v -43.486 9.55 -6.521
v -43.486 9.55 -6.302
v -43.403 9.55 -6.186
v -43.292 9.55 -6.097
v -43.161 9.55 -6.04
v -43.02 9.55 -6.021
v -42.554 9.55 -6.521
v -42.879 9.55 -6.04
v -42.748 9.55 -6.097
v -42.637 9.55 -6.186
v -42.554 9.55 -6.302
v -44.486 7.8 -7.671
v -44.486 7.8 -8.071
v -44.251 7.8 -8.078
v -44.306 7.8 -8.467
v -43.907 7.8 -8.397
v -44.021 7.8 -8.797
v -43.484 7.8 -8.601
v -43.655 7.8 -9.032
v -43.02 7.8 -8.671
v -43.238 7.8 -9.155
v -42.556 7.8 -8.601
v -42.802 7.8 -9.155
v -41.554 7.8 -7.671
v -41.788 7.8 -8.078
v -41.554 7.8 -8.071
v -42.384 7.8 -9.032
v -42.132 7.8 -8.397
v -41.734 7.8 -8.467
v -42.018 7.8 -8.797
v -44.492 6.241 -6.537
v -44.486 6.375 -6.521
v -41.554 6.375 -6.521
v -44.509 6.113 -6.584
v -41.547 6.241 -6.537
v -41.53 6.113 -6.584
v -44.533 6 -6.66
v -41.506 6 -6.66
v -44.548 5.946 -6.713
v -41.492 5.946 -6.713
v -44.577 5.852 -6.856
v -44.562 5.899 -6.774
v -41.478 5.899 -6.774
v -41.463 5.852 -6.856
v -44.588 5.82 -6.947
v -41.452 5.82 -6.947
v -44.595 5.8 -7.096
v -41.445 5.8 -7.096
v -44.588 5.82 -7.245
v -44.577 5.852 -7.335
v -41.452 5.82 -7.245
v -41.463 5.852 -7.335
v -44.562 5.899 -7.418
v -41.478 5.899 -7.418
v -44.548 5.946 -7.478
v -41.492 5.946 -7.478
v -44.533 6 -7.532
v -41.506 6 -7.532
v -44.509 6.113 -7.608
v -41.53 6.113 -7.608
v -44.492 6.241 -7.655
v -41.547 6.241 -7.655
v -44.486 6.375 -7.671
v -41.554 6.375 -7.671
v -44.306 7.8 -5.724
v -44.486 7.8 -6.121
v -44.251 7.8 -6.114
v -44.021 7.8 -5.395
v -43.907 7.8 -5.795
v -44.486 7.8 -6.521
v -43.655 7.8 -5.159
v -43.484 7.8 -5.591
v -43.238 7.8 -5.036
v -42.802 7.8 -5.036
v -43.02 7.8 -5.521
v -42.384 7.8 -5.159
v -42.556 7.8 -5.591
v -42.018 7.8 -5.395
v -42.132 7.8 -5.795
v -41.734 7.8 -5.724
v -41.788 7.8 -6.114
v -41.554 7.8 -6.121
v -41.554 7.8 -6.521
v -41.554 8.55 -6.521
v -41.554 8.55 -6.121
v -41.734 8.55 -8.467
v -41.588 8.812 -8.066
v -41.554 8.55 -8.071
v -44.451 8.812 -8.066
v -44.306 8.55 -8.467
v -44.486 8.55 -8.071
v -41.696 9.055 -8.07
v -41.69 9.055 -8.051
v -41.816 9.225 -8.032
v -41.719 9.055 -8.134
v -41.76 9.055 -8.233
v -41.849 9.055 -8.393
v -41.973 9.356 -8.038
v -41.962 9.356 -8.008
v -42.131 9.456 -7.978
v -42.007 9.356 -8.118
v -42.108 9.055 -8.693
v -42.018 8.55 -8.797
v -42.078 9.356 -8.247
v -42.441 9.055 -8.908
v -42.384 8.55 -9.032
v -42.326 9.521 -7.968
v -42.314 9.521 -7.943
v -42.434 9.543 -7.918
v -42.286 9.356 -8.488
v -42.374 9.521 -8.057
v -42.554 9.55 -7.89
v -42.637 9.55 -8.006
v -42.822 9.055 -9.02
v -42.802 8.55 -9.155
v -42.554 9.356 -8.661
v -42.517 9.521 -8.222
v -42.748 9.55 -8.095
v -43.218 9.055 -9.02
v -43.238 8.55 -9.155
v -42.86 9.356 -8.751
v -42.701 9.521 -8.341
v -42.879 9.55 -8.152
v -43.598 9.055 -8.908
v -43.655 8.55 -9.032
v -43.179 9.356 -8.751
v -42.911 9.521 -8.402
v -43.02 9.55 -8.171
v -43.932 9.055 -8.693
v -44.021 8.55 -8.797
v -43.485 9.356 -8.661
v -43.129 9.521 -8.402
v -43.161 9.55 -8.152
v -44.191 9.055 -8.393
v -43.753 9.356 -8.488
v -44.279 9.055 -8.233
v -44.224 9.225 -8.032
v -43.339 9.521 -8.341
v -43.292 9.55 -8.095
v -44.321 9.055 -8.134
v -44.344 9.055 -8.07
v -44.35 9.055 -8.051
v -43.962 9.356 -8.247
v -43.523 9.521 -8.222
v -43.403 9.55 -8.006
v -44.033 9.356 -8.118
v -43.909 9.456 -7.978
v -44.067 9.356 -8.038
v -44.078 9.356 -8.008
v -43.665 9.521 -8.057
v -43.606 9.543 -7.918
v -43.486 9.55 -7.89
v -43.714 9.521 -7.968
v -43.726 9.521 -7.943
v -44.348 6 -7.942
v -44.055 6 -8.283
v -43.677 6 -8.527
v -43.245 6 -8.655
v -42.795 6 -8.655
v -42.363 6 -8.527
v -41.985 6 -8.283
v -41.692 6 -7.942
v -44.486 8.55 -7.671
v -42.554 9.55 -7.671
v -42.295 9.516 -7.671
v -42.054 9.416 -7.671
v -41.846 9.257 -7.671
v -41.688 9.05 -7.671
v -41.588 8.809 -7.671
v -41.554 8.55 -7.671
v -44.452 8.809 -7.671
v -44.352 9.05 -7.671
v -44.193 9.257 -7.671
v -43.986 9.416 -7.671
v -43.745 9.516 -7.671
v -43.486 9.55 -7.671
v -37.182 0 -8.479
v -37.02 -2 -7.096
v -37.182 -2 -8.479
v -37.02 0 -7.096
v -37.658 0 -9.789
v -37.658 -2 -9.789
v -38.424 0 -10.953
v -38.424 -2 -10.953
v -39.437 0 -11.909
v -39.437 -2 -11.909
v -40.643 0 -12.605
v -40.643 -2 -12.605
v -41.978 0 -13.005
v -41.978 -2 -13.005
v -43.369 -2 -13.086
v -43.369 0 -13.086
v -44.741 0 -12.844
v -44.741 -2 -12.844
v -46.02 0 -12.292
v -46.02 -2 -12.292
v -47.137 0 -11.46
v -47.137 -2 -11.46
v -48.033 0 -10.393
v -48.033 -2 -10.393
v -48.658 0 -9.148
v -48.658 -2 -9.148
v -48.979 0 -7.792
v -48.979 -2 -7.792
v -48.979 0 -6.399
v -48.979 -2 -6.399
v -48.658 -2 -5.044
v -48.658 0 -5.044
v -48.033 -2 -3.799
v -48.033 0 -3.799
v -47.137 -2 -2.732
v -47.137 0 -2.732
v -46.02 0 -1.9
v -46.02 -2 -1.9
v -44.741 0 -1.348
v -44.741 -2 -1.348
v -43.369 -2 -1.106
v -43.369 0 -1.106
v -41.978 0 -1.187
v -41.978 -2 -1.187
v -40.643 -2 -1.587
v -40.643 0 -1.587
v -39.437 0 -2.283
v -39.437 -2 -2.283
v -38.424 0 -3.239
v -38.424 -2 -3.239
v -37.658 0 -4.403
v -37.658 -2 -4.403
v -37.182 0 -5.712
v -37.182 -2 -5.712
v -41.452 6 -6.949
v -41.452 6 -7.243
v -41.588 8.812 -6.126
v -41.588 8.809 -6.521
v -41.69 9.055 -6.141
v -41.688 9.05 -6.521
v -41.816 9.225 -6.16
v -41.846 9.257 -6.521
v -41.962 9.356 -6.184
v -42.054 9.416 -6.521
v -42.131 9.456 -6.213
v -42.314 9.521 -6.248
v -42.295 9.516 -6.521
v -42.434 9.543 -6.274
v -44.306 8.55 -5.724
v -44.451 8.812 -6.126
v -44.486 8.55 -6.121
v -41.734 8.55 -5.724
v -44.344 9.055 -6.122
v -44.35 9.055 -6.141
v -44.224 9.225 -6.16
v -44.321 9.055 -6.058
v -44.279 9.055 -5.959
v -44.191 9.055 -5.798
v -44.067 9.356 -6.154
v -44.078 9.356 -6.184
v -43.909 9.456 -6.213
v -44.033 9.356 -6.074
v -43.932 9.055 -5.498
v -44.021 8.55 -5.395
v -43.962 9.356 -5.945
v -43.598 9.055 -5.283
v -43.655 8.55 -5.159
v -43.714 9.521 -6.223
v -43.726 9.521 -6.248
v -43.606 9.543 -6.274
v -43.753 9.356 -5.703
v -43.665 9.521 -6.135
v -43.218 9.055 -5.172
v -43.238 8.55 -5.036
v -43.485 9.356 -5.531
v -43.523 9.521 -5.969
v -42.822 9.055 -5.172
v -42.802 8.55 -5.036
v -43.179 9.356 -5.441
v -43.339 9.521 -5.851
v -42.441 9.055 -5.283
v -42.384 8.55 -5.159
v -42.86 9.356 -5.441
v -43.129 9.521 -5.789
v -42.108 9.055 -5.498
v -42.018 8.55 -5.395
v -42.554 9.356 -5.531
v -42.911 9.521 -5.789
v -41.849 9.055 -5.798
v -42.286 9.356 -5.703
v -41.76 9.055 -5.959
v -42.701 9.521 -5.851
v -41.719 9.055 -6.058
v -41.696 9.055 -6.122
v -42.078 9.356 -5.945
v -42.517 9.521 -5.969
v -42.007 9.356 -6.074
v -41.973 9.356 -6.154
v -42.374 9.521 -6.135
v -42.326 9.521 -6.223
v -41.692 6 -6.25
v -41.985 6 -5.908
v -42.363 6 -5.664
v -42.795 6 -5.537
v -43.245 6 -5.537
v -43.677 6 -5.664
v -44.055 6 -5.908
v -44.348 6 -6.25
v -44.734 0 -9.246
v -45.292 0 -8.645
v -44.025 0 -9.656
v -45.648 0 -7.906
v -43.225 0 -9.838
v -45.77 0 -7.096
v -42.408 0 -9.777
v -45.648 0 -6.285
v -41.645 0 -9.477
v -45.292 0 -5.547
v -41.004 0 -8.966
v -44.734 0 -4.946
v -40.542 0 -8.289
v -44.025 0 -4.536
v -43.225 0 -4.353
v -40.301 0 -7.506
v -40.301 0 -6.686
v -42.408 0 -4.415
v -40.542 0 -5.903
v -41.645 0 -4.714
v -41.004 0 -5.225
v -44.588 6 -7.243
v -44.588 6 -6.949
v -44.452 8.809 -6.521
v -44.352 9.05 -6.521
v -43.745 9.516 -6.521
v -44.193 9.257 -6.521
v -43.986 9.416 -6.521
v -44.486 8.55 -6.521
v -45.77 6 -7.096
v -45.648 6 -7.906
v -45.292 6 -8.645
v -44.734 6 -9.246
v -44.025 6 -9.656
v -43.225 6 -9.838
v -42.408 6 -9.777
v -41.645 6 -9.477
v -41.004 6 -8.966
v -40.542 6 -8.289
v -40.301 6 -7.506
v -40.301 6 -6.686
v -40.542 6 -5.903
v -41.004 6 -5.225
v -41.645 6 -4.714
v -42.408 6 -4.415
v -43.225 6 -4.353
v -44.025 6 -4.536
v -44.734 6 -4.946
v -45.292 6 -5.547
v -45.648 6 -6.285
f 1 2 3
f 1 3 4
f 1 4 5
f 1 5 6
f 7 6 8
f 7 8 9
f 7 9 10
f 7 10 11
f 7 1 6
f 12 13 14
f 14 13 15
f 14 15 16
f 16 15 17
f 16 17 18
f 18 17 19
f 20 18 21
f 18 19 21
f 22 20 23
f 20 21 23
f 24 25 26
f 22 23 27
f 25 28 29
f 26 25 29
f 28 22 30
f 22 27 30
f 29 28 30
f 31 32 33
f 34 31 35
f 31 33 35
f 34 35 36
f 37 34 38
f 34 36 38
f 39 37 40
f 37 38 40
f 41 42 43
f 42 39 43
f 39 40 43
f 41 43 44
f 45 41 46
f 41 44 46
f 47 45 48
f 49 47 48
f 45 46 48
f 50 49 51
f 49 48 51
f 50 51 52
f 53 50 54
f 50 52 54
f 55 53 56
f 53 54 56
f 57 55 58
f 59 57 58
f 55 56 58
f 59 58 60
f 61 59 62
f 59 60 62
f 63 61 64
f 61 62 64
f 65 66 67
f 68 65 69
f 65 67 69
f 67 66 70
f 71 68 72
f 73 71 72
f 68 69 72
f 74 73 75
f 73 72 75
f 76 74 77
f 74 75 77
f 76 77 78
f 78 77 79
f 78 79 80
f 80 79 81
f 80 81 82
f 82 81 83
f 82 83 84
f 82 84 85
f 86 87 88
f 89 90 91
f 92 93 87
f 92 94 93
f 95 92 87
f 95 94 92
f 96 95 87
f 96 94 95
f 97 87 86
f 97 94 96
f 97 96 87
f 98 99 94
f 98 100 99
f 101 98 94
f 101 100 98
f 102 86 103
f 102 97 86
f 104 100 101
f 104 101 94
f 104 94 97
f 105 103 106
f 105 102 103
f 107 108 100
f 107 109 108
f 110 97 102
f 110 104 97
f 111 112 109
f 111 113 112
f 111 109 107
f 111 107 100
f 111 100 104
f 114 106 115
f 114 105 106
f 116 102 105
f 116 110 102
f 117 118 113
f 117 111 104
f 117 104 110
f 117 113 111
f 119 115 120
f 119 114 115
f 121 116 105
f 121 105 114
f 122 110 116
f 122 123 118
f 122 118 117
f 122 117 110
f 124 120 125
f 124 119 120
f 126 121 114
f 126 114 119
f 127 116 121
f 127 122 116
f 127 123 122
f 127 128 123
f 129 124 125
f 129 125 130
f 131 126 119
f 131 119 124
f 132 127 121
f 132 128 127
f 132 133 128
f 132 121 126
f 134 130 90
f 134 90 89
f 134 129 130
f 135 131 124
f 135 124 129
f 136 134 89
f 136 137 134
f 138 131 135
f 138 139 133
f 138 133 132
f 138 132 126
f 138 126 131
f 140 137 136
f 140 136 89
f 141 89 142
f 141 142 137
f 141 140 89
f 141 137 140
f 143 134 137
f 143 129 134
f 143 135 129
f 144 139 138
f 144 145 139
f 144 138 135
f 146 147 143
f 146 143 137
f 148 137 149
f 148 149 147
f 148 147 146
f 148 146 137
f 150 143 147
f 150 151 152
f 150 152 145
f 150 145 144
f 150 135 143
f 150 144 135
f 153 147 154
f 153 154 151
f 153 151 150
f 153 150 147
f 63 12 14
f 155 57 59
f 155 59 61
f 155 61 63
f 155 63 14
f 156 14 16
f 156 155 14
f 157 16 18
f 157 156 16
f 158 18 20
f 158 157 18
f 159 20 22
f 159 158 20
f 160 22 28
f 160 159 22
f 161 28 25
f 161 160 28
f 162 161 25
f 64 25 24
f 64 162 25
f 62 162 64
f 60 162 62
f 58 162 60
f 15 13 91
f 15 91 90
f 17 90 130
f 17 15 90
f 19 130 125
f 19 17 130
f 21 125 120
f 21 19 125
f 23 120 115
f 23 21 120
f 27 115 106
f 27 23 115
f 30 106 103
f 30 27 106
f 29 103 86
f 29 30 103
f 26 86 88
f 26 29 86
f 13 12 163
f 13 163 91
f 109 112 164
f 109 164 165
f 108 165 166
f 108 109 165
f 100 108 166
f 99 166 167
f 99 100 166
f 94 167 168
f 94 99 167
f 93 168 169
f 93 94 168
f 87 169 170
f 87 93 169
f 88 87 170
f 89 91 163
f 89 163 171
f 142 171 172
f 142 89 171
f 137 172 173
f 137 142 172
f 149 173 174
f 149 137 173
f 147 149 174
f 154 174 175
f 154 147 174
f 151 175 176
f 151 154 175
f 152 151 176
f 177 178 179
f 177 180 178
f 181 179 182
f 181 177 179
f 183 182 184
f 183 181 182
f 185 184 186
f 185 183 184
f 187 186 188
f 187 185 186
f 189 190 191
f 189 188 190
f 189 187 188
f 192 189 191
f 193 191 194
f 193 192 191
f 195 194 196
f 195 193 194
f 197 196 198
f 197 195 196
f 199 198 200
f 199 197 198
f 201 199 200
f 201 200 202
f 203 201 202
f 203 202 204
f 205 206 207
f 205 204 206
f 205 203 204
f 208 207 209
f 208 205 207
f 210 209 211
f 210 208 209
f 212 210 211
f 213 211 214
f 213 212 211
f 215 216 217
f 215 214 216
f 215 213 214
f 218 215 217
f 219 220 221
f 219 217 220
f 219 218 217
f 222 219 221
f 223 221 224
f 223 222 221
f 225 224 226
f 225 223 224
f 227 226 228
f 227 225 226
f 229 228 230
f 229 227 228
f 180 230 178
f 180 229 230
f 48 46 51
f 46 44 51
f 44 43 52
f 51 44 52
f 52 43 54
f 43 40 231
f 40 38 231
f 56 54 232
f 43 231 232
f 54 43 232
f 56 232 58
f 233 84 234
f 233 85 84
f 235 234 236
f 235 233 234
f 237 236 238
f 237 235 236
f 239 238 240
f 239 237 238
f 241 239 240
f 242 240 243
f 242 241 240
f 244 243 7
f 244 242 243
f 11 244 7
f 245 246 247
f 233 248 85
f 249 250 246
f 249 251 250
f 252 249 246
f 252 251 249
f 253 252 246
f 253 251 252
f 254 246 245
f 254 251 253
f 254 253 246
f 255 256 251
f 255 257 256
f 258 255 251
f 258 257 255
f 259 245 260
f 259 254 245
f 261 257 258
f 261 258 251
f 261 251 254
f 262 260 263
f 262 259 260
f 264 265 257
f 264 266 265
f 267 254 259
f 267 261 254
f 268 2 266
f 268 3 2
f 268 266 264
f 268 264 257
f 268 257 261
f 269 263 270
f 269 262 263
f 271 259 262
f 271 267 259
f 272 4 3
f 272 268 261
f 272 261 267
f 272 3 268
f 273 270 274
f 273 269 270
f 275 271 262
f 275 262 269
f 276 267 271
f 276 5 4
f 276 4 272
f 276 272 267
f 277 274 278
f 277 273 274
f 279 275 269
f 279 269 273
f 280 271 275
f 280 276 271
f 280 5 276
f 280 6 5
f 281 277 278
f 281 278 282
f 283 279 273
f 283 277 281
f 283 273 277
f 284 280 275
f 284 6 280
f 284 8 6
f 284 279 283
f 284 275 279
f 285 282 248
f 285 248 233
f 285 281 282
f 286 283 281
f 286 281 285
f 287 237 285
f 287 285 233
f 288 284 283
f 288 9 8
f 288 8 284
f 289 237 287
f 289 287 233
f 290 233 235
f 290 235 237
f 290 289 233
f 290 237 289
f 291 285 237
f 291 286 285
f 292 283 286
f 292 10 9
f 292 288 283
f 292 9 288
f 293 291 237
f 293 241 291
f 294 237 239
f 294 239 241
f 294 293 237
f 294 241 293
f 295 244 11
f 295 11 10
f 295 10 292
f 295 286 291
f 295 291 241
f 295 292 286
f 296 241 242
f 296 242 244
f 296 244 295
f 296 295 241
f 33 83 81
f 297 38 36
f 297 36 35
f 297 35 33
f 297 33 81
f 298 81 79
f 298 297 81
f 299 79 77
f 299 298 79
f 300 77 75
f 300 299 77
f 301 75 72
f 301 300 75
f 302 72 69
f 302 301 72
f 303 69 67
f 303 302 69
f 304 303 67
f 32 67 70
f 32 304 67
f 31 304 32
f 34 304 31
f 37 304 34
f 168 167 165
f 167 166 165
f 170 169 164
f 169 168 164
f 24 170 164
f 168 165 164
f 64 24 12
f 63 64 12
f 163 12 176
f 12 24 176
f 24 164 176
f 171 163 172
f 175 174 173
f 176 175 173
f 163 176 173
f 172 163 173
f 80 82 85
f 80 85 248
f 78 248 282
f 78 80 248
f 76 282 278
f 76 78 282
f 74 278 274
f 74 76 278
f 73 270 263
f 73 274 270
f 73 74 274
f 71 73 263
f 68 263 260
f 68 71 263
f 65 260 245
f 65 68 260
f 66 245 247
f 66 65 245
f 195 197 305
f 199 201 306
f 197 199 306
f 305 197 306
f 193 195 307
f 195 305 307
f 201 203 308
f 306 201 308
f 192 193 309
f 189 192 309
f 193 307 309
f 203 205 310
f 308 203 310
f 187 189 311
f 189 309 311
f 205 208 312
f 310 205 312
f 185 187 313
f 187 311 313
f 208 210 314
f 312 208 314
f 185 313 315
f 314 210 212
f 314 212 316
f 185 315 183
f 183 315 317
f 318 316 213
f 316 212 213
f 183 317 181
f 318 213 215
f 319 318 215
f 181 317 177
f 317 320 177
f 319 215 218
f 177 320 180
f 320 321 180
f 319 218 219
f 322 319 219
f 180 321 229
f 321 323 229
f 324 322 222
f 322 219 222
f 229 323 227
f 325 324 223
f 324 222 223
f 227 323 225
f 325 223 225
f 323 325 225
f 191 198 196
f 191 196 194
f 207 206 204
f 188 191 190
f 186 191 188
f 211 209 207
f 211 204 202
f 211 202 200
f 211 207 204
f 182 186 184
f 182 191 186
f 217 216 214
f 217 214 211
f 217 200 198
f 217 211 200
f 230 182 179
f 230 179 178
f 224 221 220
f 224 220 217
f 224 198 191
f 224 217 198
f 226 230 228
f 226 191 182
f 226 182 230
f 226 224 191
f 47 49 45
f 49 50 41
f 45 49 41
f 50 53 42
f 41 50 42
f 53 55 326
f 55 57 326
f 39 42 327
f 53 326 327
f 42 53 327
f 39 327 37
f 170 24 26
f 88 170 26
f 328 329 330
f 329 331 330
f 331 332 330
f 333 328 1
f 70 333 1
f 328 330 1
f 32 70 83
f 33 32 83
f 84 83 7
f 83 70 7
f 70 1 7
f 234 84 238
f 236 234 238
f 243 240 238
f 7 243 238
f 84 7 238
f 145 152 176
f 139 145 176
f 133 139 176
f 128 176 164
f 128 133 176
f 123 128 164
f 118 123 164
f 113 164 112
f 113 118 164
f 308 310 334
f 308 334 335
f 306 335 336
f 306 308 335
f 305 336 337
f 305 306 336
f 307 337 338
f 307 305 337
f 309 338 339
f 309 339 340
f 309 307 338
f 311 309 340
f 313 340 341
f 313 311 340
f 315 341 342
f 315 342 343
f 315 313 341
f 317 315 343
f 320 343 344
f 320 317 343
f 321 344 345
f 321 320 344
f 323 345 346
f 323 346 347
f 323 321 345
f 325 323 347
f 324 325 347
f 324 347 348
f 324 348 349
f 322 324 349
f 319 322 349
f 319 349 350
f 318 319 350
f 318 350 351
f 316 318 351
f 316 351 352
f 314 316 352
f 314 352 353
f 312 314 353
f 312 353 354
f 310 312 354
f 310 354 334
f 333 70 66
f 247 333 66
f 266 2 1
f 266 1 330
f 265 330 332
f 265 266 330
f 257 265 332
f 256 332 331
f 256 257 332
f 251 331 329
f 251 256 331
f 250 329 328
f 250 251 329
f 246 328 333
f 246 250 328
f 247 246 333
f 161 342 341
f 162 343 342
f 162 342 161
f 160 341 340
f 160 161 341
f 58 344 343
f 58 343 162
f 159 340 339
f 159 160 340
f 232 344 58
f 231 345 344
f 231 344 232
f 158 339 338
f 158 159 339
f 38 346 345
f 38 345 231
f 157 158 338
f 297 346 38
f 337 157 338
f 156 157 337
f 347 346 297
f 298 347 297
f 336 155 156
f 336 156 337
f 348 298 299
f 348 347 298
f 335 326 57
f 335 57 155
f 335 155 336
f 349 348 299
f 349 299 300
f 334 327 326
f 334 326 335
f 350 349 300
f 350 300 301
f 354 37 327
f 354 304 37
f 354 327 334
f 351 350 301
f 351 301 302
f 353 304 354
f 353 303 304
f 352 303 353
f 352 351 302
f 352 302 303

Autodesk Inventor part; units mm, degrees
ref_plane "YZ Plane" through (0, 0, 0) normal (1, 0, 0) x (0, 1, 0)
ref_plane "XZ Plane" through (0, 0, 0) normal (0, 1, 0) x (-1, 0, 0)
ref_plane "XY Plane" through (0, 0, 0) normal (0, 0, 1) x (1, 0, 0)
sketch "Sketch1" plane through (0, 0, 0) normal (0, 1, 0) x (-1, 0, 0)
  circle A0 centre (43.0199, -7.0958) radius 2.75
  circle A1 centre (-31.8801, -7.0958) radius 2.75
  circle A2 centre (44.3199, 41.1042) radius 2.75
  circle A3 centre (-38.2801, 41.1042) radius 2.75
  line L0 (58.8879, -10.055) -> (-40.7911, -10.055) construction
  line L1 (-40.7911, -10.055) -> (-40.7911, 44.0634) construction
  line L2 (-40.7911, 44.0634) -> (58.8879, 44.0634) construction
  line L3 (58.8879, 44.0634) -> (58.8879, -10.055) construction
  line L4 (43.0199, -7.0958) -> (43.0199, -10.055)
  line L5 (44.3199, 41.1042) -> (44.3199, 44.0634)
  line L6 (47.0699, -9.8458) -> (-41.0301, -9.8458)
  line L7 (-41.0301, -9.8458) -> (-41.0301, 43.8542)
  line L8 (-41.0301, 43.8542) -> (47.0699, 43.8542)
  line L9 (47.0699, 43.8542) -> (47.0699, -9.8458)
  dimension "d0" = 5.5
  dimension "d1" = 74.9
  dimension "d2" = 1.3
  dimension "d3" = 48.2
  dimension "d5" = 82.6
  dimension "d9" = 15.868
  dimension "d10" = 54.1184
  dimension "d11" = 99.679
extrude "Extrusion2" add sketch "Sketch1" along normal blind 6 contours A0
sketch "Sketch4" plane through (-43.0199, 6, -7.0958) normal (0, 1, 0) x (1, 0, 0)
  circle A0 centre (0, 0) radius 2.75 projected
  circle A1 centre (0, 0) radius 1.575
  point P0 (43.0199, -7.0958)
  dimension "d24" = 3.15
extrude "Extrusion3" add sketch "Sketch4" along normal blind 1.8 contours A1
sketch "Sketch5" plane through (-43.0199, 7.8, -7.0958) normal (0, 1, 0) x (1, 0, 0)
  line L0 (-1.575, -0.575) -> (1.575, -0.575)
  line L1 (1.575, -0.575) -> (1.575, 0.575)
  line L2 (1.575, 0.575) -> (-1.575, 0.575)
  line L3 (-1.575, 0.575) -> (-1.575, -0.575)
  line L4 (-1.575, -0.575) -> (1.575, 0.575) construction
  line L5 (1.575, -0.575) -> (-1.575, 0.575) construction
  circle A0 centre (0, 0) radius 1.575 projected
  point P0 (43.0199, -7.0958)
  point P1 (-1.4663, -0.575)
  point P2 (1.4663, -0.575)
  point P3 (1.4663, 0.575)
  point P4 (-1.4663, 0.575)
  dimension "d27" = 1
extrude "Extrusion4" cut sketch "Sketch5" against normal blind 6 contours A0 L2 L0
sketch "Sketch6" plane through (-43.0199, 7.8, -7.0958) normal (0, 1, 0) x (1, 0, 0)
  arc A0 (1.4663, 0.575) -> (-1.4663, 0.575) centre (0, 0) ccw construction
  line L0 (-1.4663, 0.575) -> (-1.4663, 0.975)
  line L1 (-1.4663, 0.575) -> (1.4663, 0.575) projected
  line L2 (1.4663, 0.575) -> (1.4663, 0.975)
  arc A1 (1.4663, 0.975) -> (-1.4663, 0.975) centre (0, 0.5477) ccw
  arc A2 (-1.4663, 0.575) -> (-1.4663, -0.575) centre (0, 0) ccw construction
  line L3 (-1.575, 0) -> (1.575, 0) construction
  arc A3 (1.4663, -0.575) -> (1.4663, 0.575) centre (0, 0) ccw construction
  line L4 (-1.4663, -0.575) -> (-1.4663, -0.975)
  line L5 (-1.4663, -0.575) -> (1.4663, -0.575)
  line L6 (1.4663, -0.575) -> (1.4663, -0.975)
  arc A4 (-1.4663, -0.975) -> (1.4663, -0.975) centre (0, -0.5477) ccw
  point P0 (43.0199, -7.0958)
  point P1 (0, 1.575)
  point P2 (0, 2.075)
  dimension "d30" = 0.4
  dimension "d31" = 0.4
  dimension "d32" = 0.5
extrude "Extrusion5" add sketch "Sketch6" along normal blind 1.75
fillet "Fillet1" radius 1 6 edges at (-44.4862, 9.55, -6.3208) (-41.5537, 9.55, -6.3208) (-43.0199, 9.55, -5.0208) (-41.5537, 9.55, -7.8708) (-44.4862, 9.55, -7.8708) (-43.0199, 9.55, -9.1708)
sketch "Sketch7" plane through (-43.0199, 1.8, -7.0958) normal (0, 1, 0) x (1, 0, 0)
  line L0 (1.4663, -0.575) -> (-1.4663, -0.575) projected
  arc A0 (1.4663, -0.575) -> (1.4663, 0.575) centre (0, 0) ccw projected
  line L1 (-1.4663, 0.575) -> (1.4663, 0.575) projected
  arc A1 (-1.4663, 0.575) -> (-1.4663, -0.575) centre (0, 0) ccw projected
  point P0 (43.0199, -7.0958)
extrude "Extrusion6" add sketch "Sketch7" along normal blind 4
fillet "Fillet2" radius 0.575 2 edges at (-43.0199, 5.8, -7.6708) (-43.0199, 5.8, -6.5208)
sketch "Sketch16" plane through (-43.0199, 0, -7.0958) normal (0, -1, 0) x (1, 0, 0)
  circle A0 centre (0, 0) radius 6
  point P0 (43.0199, 7.0958)
  dimension "d56" = 12
extrude "Extrusion9" add sketch "Sketch16" along normal blind 2
properties part number "arduino_mega_standoffs_retention-clips_single"
